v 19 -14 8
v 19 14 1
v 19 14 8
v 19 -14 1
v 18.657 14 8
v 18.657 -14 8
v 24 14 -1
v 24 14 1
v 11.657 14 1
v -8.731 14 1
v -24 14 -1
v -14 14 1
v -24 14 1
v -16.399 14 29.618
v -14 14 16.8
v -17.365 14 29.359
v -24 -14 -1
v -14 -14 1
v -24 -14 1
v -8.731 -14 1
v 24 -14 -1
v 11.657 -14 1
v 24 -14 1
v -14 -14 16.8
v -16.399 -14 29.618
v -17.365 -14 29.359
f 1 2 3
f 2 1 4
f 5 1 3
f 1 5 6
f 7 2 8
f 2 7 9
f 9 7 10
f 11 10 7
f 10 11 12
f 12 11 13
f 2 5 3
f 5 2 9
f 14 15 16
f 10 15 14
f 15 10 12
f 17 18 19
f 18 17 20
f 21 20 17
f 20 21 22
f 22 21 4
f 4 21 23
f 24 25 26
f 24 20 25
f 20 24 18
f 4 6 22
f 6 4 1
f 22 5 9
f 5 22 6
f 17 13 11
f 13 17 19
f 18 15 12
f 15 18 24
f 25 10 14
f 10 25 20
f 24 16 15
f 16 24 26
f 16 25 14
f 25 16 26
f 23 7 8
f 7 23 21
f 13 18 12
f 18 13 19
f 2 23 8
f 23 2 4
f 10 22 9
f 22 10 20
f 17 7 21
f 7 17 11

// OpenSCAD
//base
cube([48, 28, 2], true);

//triangle avant
difference()
{
    translate([15,0,4])
        cube([8, 28, 8], true);
        
    translate([12,0,7])
        rotate([0,45,0])
            cube([8, 30, 11], true);
}

union(){
    //triangle arrière
    difference()
    {
        
        translate([-16.5,0,8.5])
            cube([15, 28, 17], true);
        
        translate([-4,0, 10.5])
            rotate([0,75,0])
                cube([18, 30, 15], true);
        
        translate([-22,0, 8.6])
            cube([16, 30, 17], true);
    }

    //fixation triangle arrière
    translate([-13,0, 15])
        rotate([0,75,0])
            cube([30, 28, 1], true);
}
//troue pilier

//pilier
